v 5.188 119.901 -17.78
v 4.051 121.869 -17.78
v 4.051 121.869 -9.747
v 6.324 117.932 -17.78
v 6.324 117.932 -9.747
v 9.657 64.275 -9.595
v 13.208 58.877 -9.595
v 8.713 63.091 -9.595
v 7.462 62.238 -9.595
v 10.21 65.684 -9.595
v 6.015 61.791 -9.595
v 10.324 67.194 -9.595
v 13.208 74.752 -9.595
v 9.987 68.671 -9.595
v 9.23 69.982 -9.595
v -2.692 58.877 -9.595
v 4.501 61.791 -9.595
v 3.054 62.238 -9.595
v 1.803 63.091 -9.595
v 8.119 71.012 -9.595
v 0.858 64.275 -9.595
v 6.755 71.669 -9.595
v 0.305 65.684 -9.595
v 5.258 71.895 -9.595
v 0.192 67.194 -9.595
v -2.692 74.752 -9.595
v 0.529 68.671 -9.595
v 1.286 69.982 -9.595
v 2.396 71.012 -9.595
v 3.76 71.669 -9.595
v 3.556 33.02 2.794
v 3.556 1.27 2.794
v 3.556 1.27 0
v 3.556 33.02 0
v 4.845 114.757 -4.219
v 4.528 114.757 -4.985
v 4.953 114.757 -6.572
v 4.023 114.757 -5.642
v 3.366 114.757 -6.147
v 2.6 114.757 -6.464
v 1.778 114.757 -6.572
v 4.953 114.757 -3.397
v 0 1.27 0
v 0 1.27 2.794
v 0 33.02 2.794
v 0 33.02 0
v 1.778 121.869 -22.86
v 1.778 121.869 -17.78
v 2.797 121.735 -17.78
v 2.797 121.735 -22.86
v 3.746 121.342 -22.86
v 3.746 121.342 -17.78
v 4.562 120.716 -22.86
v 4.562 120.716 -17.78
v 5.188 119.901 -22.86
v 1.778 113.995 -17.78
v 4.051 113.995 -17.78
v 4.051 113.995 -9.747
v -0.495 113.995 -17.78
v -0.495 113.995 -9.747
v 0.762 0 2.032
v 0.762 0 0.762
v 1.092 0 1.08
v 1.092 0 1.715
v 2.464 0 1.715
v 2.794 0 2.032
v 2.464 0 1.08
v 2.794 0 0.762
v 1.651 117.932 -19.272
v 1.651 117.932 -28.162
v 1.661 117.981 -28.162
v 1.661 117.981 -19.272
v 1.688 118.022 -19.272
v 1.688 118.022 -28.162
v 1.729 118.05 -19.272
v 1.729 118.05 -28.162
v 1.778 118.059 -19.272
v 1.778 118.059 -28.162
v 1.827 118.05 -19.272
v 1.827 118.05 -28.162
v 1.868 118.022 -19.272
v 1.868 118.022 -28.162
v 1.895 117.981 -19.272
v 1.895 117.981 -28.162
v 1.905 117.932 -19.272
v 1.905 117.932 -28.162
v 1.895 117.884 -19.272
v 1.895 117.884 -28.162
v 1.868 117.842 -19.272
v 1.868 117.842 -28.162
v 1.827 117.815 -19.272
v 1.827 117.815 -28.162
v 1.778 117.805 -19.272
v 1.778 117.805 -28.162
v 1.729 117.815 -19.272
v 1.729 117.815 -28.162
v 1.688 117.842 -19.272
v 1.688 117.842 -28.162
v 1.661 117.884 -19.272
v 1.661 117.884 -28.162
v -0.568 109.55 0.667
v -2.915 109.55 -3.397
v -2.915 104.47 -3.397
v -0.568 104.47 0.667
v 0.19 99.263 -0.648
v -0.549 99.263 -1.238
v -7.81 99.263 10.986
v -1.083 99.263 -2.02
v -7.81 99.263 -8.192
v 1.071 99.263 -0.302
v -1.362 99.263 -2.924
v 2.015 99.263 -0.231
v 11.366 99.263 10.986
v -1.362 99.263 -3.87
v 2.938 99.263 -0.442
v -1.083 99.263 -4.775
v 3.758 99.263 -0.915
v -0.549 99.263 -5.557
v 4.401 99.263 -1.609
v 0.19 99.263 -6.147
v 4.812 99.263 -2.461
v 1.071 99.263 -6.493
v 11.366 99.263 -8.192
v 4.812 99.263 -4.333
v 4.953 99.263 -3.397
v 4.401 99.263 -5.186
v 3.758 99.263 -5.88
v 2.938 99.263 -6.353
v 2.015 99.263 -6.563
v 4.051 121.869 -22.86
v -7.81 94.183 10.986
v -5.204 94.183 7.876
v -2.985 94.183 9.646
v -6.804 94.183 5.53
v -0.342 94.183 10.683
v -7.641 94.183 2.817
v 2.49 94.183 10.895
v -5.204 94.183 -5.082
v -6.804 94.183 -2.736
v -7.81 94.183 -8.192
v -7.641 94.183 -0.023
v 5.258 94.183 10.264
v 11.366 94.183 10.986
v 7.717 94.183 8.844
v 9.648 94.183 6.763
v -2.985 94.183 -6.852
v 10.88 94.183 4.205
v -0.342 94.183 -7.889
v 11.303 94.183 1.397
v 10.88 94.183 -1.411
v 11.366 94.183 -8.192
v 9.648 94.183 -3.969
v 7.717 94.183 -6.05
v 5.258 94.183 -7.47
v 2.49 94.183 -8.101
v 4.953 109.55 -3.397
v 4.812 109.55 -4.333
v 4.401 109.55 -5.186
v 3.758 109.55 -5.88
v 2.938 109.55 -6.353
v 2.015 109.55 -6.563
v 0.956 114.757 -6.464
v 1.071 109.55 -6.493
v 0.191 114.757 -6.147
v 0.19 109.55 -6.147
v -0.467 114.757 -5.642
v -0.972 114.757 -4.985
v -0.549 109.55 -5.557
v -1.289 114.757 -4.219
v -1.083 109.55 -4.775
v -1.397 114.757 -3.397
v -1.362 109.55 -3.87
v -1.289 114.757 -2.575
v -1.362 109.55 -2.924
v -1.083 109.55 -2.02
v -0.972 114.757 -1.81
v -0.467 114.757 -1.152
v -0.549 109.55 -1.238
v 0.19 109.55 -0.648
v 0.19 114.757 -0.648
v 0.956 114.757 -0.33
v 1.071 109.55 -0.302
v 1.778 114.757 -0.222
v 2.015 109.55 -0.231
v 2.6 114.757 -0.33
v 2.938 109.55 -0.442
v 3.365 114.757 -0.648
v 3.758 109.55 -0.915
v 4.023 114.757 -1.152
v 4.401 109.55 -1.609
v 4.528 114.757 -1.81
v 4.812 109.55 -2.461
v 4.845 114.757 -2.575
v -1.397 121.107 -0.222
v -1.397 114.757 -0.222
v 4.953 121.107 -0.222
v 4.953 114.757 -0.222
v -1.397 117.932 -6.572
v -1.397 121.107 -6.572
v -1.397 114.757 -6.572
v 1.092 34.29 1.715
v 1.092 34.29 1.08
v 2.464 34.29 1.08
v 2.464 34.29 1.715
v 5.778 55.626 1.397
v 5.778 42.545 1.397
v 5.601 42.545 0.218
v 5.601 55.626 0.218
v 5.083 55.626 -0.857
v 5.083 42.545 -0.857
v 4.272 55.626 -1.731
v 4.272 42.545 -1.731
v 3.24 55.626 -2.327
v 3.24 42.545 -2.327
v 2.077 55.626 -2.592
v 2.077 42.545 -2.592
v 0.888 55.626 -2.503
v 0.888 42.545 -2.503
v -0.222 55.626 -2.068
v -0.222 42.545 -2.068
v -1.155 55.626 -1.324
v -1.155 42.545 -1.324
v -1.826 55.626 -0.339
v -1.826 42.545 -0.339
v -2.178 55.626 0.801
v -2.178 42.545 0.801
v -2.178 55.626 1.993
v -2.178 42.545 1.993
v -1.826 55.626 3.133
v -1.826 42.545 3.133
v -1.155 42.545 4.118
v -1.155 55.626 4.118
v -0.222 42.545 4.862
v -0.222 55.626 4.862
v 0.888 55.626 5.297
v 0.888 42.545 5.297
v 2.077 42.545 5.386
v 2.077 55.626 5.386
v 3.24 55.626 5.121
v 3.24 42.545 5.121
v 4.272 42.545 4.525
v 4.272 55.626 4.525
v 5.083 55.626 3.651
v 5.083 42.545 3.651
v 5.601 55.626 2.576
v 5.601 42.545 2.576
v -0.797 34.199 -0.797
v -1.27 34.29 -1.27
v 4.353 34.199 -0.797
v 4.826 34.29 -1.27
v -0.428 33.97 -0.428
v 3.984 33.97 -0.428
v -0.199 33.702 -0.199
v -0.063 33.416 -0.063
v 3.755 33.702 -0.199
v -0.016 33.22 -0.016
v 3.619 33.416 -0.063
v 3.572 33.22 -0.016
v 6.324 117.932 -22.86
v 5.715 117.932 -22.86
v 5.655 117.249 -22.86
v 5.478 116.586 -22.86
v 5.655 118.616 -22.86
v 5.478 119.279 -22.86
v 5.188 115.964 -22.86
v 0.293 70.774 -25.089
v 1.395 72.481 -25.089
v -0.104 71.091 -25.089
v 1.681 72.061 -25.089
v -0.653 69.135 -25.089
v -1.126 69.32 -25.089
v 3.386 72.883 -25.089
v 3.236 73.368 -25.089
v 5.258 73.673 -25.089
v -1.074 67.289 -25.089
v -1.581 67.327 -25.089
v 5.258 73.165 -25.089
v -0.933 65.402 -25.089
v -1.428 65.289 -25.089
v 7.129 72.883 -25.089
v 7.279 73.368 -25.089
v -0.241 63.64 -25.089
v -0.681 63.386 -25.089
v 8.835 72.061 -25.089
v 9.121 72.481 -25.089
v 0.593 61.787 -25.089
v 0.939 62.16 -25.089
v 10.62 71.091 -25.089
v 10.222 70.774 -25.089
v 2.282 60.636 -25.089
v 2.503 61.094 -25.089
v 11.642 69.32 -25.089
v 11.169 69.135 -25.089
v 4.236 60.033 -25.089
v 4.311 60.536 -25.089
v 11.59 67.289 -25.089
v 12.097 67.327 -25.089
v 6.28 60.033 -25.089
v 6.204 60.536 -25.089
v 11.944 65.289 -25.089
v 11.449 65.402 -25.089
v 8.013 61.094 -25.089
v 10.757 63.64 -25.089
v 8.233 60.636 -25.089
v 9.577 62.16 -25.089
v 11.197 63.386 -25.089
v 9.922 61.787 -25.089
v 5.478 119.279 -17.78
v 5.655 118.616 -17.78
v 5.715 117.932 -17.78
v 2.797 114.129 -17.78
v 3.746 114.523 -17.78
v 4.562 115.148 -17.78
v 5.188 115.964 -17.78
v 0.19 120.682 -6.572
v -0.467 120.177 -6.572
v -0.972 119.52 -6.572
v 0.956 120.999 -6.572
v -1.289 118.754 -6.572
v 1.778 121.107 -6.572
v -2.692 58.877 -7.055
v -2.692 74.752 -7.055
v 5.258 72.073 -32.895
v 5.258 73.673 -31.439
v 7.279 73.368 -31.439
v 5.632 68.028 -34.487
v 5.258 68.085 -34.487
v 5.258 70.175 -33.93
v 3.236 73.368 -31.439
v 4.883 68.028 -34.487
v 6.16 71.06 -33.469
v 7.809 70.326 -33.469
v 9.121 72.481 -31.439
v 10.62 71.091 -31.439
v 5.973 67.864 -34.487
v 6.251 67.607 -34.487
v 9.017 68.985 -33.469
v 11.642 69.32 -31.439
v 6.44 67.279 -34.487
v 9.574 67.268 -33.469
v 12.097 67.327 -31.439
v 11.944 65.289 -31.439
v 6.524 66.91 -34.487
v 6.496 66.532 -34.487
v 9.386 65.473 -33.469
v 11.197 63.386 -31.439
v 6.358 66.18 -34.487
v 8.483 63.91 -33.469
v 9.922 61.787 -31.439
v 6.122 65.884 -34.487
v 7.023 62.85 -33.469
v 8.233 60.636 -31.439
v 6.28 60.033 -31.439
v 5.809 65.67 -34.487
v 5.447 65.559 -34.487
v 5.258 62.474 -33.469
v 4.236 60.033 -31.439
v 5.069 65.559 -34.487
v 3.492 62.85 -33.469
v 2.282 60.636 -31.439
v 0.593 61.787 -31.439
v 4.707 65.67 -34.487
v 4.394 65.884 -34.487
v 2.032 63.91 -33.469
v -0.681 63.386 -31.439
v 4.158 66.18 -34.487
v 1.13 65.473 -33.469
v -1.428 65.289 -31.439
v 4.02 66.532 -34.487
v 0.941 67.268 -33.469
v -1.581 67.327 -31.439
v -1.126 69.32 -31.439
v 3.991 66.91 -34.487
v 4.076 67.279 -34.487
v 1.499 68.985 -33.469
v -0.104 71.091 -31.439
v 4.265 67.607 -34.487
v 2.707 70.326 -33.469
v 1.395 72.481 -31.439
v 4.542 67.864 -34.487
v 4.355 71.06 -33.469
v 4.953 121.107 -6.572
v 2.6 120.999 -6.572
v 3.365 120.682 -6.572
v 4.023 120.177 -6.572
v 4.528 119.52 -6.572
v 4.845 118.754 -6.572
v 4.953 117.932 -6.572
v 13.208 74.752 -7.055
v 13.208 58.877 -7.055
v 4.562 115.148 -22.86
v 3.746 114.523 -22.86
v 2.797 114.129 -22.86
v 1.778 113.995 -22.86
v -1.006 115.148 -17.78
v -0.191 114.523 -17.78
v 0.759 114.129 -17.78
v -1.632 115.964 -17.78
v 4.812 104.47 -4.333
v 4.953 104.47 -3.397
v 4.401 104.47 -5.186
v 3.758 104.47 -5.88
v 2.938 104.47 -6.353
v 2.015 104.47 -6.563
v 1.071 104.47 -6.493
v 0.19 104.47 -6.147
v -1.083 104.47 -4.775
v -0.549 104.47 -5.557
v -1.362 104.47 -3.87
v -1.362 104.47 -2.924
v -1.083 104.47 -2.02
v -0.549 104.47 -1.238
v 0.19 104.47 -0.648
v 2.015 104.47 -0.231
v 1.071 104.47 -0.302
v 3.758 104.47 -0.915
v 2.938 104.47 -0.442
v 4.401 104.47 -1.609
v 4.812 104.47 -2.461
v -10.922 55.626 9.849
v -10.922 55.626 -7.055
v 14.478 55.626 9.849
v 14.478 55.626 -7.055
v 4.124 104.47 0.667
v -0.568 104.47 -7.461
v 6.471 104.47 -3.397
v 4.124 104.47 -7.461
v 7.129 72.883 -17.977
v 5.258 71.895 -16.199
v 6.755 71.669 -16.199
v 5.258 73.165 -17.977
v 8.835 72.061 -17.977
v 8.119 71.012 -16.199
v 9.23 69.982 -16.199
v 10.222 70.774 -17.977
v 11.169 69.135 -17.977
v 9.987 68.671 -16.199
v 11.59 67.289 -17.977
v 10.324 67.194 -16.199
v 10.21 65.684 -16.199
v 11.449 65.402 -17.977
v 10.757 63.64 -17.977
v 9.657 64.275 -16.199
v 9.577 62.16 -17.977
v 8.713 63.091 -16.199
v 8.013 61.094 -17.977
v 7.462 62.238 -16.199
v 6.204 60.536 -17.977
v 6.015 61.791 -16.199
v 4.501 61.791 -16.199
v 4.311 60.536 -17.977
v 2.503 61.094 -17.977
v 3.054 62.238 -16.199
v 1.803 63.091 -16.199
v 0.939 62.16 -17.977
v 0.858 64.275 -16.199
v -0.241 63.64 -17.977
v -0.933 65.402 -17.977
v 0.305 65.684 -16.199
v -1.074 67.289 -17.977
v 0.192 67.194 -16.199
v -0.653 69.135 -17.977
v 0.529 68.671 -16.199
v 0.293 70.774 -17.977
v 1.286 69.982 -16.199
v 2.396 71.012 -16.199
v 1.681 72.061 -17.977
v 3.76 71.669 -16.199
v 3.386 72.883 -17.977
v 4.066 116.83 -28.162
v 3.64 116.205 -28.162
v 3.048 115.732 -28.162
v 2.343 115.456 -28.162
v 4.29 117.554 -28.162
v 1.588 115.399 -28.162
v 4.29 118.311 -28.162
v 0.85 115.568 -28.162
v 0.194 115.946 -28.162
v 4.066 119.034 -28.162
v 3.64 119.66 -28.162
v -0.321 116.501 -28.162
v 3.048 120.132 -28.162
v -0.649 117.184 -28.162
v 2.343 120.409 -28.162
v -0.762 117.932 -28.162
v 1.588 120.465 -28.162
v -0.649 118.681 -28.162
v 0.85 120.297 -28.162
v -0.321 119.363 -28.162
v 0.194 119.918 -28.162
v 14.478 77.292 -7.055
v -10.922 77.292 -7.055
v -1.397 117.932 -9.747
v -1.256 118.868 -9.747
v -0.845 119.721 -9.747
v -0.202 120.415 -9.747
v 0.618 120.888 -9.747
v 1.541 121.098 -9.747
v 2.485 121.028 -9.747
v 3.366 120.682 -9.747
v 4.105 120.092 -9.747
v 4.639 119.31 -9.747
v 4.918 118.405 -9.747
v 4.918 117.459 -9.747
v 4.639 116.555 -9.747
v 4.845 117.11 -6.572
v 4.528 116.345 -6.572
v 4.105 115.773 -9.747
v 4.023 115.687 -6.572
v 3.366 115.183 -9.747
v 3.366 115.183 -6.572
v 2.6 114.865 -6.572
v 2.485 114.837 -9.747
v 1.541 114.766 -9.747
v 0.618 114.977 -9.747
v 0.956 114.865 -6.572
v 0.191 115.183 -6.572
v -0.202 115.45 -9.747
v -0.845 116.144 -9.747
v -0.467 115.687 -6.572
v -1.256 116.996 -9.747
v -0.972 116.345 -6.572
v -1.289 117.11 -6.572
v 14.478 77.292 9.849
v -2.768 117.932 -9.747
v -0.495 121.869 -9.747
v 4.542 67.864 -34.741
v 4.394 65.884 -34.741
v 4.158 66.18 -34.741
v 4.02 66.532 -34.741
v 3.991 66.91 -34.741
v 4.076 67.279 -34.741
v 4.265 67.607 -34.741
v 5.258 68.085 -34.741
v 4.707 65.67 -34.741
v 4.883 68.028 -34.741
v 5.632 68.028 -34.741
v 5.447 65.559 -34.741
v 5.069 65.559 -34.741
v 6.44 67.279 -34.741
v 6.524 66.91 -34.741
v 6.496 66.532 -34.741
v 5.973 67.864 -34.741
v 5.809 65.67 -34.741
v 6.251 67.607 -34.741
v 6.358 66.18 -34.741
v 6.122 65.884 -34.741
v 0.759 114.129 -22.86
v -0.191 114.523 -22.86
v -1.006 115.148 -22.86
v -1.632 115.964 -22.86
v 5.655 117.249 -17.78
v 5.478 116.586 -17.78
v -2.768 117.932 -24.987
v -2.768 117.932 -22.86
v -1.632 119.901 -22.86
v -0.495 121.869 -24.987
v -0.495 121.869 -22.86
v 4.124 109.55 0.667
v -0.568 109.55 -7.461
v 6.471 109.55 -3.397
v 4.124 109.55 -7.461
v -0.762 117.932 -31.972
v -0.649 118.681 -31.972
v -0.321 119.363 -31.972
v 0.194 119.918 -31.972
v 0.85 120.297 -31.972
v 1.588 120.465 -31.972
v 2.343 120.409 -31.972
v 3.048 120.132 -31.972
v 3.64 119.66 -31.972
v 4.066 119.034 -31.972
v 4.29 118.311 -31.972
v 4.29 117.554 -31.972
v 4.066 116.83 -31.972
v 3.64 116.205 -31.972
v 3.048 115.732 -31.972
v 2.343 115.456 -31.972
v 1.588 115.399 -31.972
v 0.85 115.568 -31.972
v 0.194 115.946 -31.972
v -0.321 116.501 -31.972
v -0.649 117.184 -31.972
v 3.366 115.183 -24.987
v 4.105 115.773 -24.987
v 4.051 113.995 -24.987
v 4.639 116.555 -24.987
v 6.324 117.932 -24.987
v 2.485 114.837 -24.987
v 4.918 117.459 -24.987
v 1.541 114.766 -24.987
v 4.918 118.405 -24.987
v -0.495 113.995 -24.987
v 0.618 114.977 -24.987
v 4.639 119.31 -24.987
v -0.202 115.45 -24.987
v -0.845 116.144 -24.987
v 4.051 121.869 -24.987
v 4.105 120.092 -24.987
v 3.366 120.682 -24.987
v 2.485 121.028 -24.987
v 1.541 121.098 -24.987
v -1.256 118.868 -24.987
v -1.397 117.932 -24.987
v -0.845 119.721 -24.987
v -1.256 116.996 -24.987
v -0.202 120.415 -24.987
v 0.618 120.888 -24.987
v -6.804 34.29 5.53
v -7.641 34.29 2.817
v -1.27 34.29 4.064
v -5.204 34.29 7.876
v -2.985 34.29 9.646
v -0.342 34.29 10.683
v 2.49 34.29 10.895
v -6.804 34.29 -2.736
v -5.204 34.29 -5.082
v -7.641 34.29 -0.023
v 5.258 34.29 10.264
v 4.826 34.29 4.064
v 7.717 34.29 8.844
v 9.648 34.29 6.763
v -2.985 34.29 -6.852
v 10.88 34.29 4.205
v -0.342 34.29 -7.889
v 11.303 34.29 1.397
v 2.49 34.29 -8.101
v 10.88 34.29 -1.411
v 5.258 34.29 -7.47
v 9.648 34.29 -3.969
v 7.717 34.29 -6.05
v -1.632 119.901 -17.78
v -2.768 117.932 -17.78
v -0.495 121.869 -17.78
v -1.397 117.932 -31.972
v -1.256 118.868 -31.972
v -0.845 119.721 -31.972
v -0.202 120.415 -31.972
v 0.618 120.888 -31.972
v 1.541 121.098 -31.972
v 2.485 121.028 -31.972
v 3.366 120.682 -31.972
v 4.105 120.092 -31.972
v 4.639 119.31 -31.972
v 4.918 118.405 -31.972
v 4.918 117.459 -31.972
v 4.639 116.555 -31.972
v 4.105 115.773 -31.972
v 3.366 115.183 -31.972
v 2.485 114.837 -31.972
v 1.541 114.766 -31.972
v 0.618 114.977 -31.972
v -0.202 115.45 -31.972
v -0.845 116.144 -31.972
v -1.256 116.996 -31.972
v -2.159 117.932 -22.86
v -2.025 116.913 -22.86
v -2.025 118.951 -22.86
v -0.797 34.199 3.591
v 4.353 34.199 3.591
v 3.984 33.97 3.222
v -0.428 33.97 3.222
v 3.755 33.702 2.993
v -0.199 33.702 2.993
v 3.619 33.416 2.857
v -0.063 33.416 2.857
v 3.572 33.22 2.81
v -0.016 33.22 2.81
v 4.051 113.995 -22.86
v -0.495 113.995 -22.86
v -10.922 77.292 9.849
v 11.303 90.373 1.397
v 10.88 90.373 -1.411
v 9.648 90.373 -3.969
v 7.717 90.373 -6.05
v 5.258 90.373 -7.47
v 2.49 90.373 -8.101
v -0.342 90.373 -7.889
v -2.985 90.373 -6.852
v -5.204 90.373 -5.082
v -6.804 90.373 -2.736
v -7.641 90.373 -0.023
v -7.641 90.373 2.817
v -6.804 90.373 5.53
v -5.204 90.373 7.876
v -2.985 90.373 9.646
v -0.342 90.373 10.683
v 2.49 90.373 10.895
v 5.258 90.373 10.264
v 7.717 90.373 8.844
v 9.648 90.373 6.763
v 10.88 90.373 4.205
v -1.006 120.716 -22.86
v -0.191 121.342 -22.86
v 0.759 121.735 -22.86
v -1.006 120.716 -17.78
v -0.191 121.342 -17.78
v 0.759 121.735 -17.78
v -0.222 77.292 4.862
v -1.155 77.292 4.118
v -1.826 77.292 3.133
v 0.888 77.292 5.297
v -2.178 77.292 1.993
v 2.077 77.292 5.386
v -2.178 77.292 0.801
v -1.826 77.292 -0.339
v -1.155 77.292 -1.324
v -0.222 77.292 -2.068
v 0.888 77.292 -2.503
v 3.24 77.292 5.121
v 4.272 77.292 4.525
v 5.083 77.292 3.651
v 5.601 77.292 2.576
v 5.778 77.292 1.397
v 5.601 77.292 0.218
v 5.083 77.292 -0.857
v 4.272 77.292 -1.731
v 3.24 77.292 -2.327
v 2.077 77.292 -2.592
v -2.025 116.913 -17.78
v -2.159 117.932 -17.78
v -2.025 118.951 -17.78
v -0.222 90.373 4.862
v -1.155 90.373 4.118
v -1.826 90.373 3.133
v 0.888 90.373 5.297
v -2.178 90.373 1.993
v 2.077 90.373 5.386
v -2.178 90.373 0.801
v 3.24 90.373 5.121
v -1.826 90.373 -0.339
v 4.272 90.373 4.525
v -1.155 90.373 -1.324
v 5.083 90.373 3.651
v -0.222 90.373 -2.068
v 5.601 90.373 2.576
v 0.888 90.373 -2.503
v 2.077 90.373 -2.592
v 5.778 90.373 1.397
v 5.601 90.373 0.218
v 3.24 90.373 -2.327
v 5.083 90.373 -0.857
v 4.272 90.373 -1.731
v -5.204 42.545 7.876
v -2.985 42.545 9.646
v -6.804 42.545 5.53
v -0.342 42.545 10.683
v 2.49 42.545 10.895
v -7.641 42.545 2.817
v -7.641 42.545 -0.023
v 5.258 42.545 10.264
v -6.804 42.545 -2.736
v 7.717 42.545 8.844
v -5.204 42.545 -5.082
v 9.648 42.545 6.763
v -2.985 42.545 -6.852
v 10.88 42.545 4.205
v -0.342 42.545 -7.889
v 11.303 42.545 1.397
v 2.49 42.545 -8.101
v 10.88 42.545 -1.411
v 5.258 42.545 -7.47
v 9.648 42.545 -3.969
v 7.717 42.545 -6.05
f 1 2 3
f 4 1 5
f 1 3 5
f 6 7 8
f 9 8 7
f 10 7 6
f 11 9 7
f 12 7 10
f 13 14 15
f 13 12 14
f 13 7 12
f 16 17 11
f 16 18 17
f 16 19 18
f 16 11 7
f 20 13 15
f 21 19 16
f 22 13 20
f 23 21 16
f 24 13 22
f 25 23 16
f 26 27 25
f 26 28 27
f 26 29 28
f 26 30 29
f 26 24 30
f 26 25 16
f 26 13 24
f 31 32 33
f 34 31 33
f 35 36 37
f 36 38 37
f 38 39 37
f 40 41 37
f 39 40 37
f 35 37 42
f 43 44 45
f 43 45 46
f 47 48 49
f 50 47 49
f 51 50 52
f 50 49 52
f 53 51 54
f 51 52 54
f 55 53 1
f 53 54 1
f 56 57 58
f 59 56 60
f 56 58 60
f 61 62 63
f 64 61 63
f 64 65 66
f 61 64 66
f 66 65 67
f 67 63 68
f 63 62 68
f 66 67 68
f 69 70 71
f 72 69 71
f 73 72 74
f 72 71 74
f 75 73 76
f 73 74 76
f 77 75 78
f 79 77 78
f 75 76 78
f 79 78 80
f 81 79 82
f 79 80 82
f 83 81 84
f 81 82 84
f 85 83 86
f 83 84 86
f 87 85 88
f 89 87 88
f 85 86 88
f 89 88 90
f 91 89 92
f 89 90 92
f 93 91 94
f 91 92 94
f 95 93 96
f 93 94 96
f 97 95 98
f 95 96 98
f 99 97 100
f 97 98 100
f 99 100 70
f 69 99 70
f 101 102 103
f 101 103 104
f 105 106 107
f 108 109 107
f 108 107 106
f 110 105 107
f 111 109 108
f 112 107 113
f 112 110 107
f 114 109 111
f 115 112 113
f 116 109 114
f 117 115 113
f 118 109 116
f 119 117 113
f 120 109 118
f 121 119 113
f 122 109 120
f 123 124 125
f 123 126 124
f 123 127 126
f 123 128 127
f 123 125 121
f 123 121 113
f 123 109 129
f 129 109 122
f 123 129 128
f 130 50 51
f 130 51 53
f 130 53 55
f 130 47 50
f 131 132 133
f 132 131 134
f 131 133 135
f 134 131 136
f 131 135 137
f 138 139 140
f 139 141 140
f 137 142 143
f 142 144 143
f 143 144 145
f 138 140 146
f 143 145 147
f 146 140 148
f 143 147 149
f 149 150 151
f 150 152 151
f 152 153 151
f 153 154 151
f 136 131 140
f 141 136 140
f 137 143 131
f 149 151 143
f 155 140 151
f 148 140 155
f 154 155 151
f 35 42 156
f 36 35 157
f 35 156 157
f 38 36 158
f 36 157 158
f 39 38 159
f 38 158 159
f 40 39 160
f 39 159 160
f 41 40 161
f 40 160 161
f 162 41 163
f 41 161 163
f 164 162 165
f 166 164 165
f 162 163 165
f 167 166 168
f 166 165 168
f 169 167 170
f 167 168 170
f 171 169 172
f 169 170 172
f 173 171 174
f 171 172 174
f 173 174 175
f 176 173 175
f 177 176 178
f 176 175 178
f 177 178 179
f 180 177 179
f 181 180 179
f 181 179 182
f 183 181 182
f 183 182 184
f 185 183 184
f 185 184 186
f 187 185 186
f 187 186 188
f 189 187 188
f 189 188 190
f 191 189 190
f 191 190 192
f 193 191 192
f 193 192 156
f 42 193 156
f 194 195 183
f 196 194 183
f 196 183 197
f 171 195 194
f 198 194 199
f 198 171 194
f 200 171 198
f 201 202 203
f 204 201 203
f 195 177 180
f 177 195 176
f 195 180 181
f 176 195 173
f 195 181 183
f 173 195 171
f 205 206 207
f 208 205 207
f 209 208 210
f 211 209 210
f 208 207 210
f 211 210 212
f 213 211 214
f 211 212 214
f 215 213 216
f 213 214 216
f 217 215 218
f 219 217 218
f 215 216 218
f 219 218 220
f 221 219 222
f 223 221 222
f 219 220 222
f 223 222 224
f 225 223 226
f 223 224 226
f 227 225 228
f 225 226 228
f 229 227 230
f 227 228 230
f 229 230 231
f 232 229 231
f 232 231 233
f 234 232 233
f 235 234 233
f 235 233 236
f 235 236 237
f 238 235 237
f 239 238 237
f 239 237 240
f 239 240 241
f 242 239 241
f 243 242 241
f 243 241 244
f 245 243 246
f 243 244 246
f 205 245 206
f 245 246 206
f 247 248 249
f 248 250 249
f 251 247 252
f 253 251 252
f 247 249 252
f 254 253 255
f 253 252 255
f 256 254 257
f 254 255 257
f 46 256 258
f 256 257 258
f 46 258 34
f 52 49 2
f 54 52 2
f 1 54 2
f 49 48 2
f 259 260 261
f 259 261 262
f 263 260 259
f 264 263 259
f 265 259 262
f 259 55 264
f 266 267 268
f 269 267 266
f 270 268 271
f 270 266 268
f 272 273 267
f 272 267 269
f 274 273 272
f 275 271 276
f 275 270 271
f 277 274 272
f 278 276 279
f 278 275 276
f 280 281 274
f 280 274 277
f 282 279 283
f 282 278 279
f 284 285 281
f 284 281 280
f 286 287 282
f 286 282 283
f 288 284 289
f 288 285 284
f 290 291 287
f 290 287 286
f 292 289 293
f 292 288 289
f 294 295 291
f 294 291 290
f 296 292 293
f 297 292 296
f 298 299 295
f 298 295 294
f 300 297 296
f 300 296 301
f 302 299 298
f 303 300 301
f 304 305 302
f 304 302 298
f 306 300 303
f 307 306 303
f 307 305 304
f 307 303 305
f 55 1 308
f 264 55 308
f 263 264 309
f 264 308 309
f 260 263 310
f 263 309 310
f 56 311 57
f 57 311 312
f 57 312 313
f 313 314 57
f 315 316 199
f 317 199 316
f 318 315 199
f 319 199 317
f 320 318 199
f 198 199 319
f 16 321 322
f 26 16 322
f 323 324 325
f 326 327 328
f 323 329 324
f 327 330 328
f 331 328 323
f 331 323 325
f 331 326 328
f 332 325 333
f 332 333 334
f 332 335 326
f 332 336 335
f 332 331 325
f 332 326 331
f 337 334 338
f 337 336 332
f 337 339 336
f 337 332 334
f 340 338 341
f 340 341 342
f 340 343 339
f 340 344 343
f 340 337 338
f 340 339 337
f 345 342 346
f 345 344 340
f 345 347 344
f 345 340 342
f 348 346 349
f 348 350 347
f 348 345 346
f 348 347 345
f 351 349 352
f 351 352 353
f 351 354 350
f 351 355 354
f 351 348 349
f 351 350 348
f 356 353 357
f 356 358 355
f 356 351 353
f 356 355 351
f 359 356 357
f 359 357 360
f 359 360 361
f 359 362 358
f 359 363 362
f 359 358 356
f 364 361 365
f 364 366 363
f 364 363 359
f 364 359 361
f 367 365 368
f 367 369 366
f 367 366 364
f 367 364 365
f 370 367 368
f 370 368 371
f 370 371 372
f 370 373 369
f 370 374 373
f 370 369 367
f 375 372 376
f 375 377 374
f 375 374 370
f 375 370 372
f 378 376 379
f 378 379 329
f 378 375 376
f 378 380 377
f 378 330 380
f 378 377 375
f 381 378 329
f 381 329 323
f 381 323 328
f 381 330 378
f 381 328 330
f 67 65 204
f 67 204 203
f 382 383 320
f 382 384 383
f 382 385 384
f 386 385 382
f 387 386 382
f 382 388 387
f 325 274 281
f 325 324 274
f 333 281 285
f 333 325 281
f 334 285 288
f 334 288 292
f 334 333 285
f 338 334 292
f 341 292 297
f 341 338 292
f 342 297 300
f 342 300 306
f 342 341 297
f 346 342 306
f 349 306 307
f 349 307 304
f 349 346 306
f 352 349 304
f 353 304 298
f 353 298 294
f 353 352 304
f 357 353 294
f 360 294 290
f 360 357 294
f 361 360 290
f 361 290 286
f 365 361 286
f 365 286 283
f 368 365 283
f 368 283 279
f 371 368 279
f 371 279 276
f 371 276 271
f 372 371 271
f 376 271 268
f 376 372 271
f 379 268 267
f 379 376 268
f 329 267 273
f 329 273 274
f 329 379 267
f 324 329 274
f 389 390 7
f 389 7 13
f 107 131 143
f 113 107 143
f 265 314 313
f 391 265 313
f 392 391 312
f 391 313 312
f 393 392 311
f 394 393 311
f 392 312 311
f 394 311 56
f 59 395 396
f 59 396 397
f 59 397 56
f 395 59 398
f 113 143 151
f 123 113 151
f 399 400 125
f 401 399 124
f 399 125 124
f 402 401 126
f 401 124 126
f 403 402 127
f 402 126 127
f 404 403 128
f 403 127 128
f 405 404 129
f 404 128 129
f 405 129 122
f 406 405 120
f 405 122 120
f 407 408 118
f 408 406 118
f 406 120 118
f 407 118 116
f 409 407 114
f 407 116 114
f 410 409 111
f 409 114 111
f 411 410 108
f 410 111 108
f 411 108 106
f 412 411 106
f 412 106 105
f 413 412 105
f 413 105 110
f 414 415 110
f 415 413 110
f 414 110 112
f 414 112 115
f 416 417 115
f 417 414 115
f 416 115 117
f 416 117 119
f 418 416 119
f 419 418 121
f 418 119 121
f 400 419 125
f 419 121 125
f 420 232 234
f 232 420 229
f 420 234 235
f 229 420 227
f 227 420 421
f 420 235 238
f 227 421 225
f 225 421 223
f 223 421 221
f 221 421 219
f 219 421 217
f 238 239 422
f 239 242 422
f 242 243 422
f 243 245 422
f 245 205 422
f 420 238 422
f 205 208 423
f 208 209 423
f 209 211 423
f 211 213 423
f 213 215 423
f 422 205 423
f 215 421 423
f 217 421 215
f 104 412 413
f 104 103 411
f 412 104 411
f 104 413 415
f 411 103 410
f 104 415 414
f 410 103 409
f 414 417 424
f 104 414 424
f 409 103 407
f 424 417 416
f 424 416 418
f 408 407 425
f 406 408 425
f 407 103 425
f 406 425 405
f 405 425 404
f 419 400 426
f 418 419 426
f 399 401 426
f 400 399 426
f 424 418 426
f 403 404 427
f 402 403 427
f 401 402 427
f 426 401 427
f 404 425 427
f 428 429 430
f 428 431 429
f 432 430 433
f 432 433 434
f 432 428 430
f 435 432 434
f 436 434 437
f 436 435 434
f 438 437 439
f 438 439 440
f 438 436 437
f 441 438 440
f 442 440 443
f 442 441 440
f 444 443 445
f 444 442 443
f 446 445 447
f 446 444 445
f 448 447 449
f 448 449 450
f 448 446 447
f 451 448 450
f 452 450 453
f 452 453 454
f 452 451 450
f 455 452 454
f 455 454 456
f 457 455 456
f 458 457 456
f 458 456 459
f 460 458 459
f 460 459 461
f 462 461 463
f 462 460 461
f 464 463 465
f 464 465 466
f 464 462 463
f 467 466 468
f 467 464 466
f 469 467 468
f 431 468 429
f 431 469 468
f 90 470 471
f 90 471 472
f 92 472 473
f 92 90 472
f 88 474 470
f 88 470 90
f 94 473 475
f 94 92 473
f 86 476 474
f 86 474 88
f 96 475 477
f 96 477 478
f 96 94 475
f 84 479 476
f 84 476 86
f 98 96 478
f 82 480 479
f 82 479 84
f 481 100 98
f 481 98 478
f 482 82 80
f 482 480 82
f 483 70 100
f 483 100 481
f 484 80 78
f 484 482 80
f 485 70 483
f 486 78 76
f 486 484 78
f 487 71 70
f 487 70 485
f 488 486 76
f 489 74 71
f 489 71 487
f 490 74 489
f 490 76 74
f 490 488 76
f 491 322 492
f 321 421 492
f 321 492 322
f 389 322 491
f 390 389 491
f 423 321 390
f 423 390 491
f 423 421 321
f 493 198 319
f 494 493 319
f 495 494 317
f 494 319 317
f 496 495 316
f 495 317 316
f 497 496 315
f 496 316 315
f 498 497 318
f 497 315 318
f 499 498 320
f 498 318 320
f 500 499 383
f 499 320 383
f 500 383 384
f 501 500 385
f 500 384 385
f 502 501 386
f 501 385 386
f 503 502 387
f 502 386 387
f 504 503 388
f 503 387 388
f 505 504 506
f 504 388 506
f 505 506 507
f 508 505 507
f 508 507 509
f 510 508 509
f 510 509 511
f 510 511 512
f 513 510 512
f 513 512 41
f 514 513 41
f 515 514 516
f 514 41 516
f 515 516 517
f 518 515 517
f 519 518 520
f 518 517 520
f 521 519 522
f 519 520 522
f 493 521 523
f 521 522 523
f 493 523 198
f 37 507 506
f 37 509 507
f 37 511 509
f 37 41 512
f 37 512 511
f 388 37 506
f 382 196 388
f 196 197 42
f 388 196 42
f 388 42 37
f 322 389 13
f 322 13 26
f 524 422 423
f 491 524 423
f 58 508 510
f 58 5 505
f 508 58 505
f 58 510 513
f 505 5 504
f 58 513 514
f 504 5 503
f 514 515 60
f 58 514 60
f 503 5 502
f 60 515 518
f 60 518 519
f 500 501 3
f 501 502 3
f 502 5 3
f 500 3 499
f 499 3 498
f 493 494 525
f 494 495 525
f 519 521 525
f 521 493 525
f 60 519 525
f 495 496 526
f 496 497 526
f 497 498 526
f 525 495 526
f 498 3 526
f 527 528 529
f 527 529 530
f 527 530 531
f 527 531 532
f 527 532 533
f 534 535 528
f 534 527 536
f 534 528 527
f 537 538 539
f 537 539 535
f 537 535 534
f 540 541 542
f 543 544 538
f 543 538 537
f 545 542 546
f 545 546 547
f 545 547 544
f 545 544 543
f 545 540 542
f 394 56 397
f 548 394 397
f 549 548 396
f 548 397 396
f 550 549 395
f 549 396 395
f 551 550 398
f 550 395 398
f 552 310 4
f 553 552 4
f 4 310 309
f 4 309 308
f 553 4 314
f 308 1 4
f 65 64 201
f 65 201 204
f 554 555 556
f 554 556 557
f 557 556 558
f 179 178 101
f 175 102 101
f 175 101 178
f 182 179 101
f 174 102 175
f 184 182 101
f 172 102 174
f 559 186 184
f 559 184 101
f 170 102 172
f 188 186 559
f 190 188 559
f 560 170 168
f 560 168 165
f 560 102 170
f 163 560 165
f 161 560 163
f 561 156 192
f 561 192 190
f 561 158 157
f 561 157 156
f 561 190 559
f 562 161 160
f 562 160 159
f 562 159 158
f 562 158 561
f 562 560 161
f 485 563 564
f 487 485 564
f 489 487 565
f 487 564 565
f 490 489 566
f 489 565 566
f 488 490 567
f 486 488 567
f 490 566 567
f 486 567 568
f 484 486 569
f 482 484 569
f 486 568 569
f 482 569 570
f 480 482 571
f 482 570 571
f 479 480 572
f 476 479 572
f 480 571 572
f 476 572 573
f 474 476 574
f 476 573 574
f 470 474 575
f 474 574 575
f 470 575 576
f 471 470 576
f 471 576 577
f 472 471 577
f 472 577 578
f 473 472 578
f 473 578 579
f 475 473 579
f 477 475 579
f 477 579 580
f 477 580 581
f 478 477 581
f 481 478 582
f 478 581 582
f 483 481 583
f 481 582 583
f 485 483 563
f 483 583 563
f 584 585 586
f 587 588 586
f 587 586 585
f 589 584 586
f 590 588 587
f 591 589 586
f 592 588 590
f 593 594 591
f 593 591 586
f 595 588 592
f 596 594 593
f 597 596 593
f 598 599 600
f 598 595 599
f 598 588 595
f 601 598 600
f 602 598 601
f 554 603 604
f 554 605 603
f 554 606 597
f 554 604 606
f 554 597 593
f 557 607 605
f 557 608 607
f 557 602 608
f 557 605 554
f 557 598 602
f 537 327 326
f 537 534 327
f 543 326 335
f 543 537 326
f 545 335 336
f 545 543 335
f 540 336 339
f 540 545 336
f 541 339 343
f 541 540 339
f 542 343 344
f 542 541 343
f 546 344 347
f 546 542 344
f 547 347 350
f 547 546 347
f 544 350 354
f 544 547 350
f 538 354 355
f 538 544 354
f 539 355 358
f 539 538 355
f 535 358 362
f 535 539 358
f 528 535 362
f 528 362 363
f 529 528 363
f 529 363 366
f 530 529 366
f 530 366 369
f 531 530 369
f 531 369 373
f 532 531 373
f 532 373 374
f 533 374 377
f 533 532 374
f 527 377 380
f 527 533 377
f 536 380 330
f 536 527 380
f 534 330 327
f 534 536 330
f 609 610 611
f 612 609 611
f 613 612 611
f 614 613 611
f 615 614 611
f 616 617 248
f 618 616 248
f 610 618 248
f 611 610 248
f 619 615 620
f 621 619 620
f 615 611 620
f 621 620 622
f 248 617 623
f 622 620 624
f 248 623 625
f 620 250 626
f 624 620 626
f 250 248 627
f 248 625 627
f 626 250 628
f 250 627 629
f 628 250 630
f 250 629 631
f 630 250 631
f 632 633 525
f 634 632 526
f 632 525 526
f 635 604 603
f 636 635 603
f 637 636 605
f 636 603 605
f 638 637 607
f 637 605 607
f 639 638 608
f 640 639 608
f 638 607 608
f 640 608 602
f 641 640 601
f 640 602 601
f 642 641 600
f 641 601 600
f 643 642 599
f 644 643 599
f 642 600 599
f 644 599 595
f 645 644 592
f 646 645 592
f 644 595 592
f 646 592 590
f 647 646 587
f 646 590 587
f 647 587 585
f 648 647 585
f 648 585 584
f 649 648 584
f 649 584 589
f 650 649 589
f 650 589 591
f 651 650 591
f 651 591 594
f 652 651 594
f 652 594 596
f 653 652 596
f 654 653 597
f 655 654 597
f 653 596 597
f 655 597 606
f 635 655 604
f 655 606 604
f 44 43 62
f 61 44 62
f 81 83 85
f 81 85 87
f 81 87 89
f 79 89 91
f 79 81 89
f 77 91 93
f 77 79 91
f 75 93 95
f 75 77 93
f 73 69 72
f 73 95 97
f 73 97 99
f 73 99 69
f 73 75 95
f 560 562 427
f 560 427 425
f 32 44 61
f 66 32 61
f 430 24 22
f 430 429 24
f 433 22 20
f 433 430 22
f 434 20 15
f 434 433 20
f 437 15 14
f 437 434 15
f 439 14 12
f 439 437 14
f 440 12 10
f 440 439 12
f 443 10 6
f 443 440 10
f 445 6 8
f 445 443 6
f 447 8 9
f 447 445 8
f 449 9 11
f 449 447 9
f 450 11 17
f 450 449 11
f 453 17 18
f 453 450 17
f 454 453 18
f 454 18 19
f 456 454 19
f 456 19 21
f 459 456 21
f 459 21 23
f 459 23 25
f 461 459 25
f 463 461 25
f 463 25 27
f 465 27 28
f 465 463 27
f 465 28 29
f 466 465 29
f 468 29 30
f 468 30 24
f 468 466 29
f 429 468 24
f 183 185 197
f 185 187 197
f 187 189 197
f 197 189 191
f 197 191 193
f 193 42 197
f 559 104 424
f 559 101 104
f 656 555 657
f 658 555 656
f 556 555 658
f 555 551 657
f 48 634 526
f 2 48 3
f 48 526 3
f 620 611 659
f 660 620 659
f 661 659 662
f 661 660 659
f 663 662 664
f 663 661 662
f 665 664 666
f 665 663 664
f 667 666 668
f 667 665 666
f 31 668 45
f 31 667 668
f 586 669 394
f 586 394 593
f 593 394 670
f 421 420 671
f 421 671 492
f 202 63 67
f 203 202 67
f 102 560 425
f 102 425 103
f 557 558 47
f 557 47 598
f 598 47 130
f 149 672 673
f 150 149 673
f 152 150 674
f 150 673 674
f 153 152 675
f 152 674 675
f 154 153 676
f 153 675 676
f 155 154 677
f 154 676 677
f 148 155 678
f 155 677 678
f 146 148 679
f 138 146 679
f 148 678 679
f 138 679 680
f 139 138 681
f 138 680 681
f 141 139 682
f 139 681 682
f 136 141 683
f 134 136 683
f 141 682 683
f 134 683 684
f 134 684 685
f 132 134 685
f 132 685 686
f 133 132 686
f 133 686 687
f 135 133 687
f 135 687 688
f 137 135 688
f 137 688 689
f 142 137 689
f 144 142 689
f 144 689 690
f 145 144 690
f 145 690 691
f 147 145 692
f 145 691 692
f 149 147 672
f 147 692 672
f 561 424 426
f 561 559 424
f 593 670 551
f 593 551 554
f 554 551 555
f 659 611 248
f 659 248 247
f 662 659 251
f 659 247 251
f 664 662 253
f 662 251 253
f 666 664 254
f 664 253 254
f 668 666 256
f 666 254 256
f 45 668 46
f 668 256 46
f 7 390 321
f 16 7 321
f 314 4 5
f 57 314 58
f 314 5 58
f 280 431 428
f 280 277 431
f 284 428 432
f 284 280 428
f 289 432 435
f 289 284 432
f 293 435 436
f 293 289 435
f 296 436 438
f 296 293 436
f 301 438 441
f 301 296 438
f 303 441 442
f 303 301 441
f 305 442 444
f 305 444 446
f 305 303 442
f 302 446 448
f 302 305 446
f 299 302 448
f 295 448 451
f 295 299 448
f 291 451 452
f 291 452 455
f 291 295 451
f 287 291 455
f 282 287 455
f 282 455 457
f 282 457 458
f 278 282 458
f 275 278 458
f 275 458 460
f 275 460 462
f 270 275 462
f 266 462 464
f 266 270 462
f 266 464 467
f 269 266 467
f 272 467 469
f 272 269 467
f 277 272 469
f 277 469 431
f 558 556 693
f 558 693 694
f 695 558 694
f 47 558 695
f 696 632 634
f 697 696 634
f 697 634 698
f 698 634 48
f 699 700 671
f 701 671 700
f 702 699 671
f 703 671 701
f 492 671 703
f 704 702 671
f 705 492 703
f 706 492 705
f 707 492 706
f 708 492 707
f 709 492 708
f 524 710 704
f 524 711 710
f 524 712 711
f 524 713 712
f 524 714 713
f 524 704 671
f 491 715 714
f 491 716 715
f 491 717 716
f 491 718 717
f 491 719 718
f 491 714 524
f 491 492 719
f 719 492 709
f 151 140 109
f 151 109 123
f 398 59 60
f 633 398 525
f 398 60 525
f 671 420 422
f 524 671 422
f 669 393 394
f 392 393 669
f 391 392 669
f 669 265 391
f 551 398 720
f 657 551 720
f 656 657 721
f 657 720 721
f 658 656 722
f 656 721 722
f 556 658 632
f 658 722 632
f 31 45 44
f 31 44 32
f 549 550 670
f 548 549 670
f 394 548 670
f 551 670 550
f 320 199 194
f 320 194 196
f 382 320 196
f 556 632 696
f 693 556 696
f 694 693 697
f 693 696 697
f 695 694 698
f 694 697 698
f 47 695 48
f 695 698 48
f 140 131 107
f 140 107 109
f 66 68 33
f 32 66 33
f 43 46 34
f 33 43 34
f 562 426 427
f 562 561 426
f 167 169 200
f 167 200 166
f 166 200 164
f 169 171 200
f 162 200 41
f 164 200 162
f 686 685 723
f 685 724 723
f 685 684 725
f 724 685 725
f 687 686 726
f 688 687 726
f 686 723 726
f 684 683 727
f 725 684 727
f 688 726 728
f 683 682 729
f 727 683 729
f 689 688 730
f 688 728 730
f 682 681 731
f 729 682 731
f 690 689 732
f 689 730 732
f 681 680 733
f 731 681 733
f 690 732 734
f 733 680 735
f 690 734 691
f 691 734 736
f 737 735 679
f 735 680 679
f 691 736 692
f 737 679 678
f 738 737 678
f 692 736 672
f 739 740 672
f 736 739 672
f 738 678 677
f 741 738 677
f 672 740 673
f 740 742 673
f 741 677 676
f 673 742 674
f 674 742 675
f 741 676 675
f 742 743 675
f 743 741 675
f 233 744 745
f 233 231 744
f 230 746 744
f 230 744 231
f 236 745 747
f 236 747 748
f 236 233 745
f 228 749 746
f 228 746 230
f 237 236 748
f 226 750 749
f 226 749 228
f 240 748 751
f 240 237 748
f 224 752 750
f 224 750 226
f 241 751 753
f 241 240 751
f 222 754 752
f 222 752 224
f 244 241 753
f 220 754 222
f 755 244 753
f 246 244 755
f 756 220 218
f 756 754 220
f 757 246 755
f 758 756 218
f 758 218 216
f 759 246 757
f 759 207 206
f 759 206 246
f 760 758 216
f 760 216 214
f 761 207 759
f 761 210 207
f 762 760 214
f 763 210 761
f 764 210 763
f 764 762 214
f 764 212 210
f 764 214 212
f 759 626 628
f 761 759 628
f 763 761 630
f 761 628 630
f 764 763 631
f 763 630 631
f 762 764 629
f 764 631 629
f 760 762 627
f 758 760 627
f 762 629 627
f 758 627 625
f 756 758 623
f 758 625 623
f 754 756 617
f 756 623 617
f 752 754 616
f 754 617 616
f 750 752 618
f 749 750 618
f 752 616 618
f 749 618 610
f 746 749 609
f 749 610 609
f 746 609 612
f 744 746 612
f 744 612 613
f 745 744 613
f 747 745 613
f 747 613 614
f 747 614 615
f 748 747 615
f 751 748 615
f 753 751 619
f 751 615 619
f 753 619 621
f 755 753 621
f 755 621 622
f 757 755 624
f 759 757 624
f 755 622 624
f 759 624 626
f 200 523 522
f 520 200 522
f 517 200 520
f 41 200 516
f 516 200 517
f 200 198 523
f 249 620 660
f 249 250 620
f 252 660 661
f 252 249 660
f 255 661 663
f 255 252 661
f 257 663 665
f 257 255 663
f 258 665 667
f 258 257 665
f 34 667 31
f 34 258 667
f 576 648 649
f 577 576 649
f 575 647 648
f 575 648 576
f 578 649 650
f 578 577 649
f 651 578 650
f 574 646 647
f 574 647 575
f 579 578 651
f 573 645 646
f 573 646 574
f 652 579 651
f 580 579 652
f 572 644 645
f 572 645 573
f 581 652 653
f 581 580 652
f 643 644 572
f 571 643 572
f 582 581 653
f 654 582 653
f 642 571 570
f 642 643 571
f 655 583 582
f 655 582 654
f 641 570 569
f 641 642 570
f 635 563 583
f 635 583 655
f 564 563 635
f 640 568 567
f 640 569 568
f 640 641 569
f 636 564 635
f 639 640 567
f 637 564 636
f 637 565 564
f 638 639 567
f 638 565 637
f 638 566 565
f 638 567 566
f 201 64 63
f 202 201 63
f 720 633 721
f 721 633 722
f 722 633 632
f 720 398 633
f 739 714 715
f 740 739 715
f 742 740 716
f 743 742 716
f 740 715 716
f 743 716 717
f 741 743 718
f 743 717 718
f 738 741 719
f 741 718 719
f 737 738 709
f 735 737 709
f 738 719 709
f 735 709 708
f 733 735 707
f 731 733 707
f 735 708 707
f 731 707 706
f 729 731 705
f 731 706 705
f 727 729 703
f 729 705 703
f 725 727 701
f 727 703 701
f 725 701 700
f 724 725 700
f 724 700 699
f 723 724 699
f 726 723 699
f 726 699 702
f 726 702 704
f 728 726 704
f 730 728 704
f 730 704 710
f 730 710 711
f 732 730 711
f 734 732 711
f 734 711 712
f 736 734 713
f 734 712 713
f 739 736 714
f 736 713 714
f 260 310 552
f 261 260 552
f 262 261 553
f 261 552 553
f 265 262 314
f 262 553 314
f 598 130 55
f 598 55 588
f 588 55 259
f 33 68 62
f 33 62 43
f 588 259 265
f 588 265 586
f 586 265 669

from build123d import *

# Parameters (mm, degrees)
SKETCH1_W            = 3.556
SKETCH1_H            = 2.794
SKETCH1_W_2          = 1.3716
SKETCH1_H_2          = 0.635
BOSS_EXTRUDE1_DEPTH  = 34.29
SKETCH2_R            = 9.525
BOSS_EXTRUDE2_DEPTH  = 8.255
SKETCH3_R            = 4.0005
BOSS_EXTRUDE3_DEPTH  = 13.081
SKETCH4_W            = 25.4
SKETCH4_H            = 16.9037
BOSS_EXTRUDE4_DEPTH  = 21.6662
SKETCH5_R            = 4.0005
BOSS_EXTRUDE5_DEPTH  = 13.081
SKETCH6_R            = 9.525
BOSS_EXTRUDE6_DEPTH  = 3.81
SKETCH7_W            = 19.177
SKETCH7_H            = 19.177
BOSS_EXTRUDE7_DEPTH  = 5.08
SKETCH8_R            = 3.175
BOSS_EXTRUDE8_DEPTH  = 15.494
SKETCH9_W            = 6.35
SKETCH9_H            = 6.35
BOSS_EXTRUDE9_DEPTH  = 6.35
SKETCH10_R           = 3.175
BOSS_EXTRUDE10_DEPTH = 3.175
BOSS_EXTRUDE11_DEPTH = 15.24
SKETCH12_R           = 3.175
BOSS_EXTRUDE12_DEPTH = 6.985
SKETCH13_W           = 15.9004
SKETCH13_H           = 15.875
BOSS_EXTRUDE13_DEPTH = 2.54
BOSS_EXTRUDE15_DEPTH = 2.54
CUT_EXTRUDE1_DEPTH   = 15
CUT_EXTRUDE2_DEPTH   = 15
FILLET1_R            = 1.27
SKETCH22_R           = 2.54
SKETCH22_R_2         = 0.127
CUT_EXTRUDE3_DEPTH   = 3.81
SKETCH22_3_R         = 0.127
CUT_EXTRUDE4_DEPTH   = 12.7
CUT_EXTRUDE7_DEPTH   = 5.08


with BuildPart() as part:
    # Sketch1 → Boss-Extrude1 (new body)
    with BuildSketch(Plane(origin=(0, 0, 0), x_dir=(1, 0, 0), z_dir=(0, 1, 0))):
        with Locations((1.778, -1.397)):
            Rectangle(SKETCH1_W, SKETCH1_H)
        with Locations((1.778, -1.397)):
            Rectangle(SKETCH1_W_2, SKETCH1_H_2, mode=Mode.SUBTRACT)
    extrude(amount=BOSS_EXTRUDE1_DEPTH)

    # Sketch2 → Boss-Extrude2 (add)
    with BuildSketch(Plane(origin=(0, 34.29, 0), x_dir=(1, 0, 0), z_dir=(0, 1, 0))):
        with Locations((1.778, -1.397)):
            Circle(SKETCH2_R)
    extrude(amount=BOSS_EXTRUDE2_DEPTH)

    # Sketch3 → Boss-Extrude3 (add)
    with BuildSketch(Plane(origin=(0, 42.545, 0), x_dir=(1, 0, 0), z_dir=(0, 1, 0))):
        with Locations((1.778, -1.397)):
            Circle(SKETCH3_R)
    extrude(amount=BOSS_EXTRUDE3_DEPTH)

    # Sketch4 → Boss-Extrude4 (add)
    with BuildSketch(Plane(origin=(0, 55.626, 0), x_dir=(1, 0, 0), z_dir=(0, 1, 0))):
        with Locations((1.778, -1.397)):
            Rectangle(SKETCH4_W, SKETCH4_H)
    extrude(amount=BOSS_EXTRUDE4_DEPTH)

    # Sketch5 → Boss-Extrude5 (add)
    with BuildSketch(Plane(origin=(0, 77.2922, 0), x_dir=(1, 0, 0), z_dir=(0, 1, 0))):
        with Locations((1.778, -1.397)):
            Circle(SKETCH5_R)
    extrude(amount=BOSS_EXTRUDE5_DEPTH)

    # Sketch6 → Boss-Extrude6 (add)
    with BuildSketch(Plane(origin=(0, 90.3732, 0), x_dir=(1, 0, 0), z_dir=(0, 1, 0))):
        with Locations((1.778, -1.397)):
            Circle(SKETCH6_R)
    extrude(amount=BOSS_EXTRUDE6_DEPTH)

    # Sketch7 → Boss-Extrude7 (add)
    with BuildSketch(Plane(origin=(0, 94.1832, 0), x_dir=(1, 0, 0), z_dir=(0, 1, 0))):
        with Locations((1.778, -1.397)):
            Rectangle(SKETCH7_W, SKETCH7_H)
    extrude(amount=BOSS_EXTRUDE7_DEPTH)

    # Sketch8 → Boss-Extrude8 (add)
    with BuildSketch(Plane(origin=(0, 99.2632, 0), x_dir=(1, 0, 0), z_dir=(0, 1, 0))):
        with Locations((1.778, 3.39725)):
            Circle(SKETCH8_R)
    extrude(amount=BOSS_EXTRUDE8_DEPTH)

    # Sketch9 → Boss-Extrude9 (add)
    with BuildSketch(Plane(origin=(0, 114.7572, 0), x_dir=(1, 0, 0), z_dir=(0, 1, 0))):
        with Locations((1.778, 3.39725)):
            Rectangle(SKETCH9_W, SKETCH9_H)
    extrude(amount=BOSS_EXTRUDE9_DEPTH)

    # Sketch10 → Boss-Extrude10 (add)
    with BuildSketch(Plane(origin=(0, 0, -6.57225), x_dir=(-1, 0, 0), z_dir=(0, 0, -1))):
        with Locations((-1.778, 117.9322)):
            Circle(SKETCH10_R)
    extrude(amount=BOSS_EXTRUDE10_DEPTH)

    # Sketch11 → Boss-Extrude11 (add)
    with BuildSketch(Plane(origin=(0, 0, -9.74725), x_dir=(-1, 0, 0), z_dir=(0, 0, -1))):
        Polygon((0.49502801, 113.9952), (2.76805602, 117.9322), (0.49502801, 121.8692), (-4.05102801, 121.8692), (-6.32405602, 117.9322), (-4.05102801, 113.9952), align=None)
    extrude(amount=BOSS_EXTRUDE11_DEPTH)

    # Sketch12 → Boss-Extrude12 (add)
    with BuildSketch(Plane(origin=(0, 0, -24.98725), x_dir=(-1, 0, 0), z_dir=(0, 0, -1))):
        with Locations((-1.778, 117.9322)):
            Circle(SKETCH12_R)
    extrude(amount=BOSS_EXTRUDE12_DEPTH)

    # Sketch13 → Boss-Extrude13 (add)
    with BuildSketch(Plane(origin=(0, 0, -7.05485), x_dir=(-1, 0, 0), z_dir=(0, 0, -1))):
        with Locations((-5.2578, 66.8147)):
            Rectangle(SKETCH13_W, SKETCH13_H)
    extrude(amount=BOSS_EXTRUDE13_DEPTH)

    # Sketch16 → Revolve1 (revolve)
    with BuildSketch(Plane(origin=(5.2578, 0, 0), x_dir=(0, 0, -1), z_dir=(1, 0, 0))):
        with BuildLine():
            Line((9.59485, 66.8147), (9.59485, 71.8947))
            Line((9.59485, 71.8947), (16.19885, 71.8947))
            Line((16.19885, 71.8947), (17.97685, 73.1647))
            Line((17.97685, 73.1647), (25.08885, 73.1647))
            Line((25.08885, 73.1647), (25.08885, 73.6727))
            Line((25.08885, 73.6727), (31.43885, 73.6727))
            ThreePointArc((31.43885, 73.6727), (33.469498821, 71.155053903), (34.48685, 68.0847))
            Line((34.48685, 68.0847), (34.74085, 68.0847))
            Line((34.74085, 68.0847), (34.74085, 66.8147))
            Line((34.74085, 66.8147), (9.59485, 66.8147))
        make_face()
    revolve(axis=Axis((5.2578, 66.8147, -9.59485), (0, 0, -1)))

    # Sketch17 → Boss-Extrude15 (add, symmetric)
    with BuildSketch(Plane(origin=(0, 107.0102, 0), x_dir=(1, 0, 0), z_dir=(0, 1, 0))):
        Polygon((6.470702988, 3.39725), (4.124351494, 7.46125), (-0.568351494, 7.46125), (-2.914702988, 3.39725), (-0.568351494, -0.66675), (4.124351494, -0.66675), align=None)
    extrude(amount=BOSS_EXTRUDE15_DEPTH, both=True)

    # Sketch20 → Cut-Extrude1 (cut)
    with BuildSketch(Plane.ZY):
        Polygon((0, 0), (0.762, 0), (0, 1.27), align=None)
        Polygon((2.794, 0), (2.794, 1.27), (2.032, 0), align=None)
    extrude(amount=-CUT_EXTRUDE1_DEPTH, mode=Mode.SUBTRACT)

    # Sketch21 → Cut-Extrude2 (cut)
    with BuildSketch(Plane(origin=(0, 0, 0), x_dir=(-1, 0, 0), z_dir=(0, 0, -1))):
        Polygon((-3.556, 1.27), (-3.556, 0), (-2.794, 0), align=None)
        Polygon((0, 1.27), (-0.762, 0), (0, 0), align=None)
    extrude(amount=-CUT_EXTRUDE2_DEPTH, mode=Mode.SUBTRACT)

    # Fillet1
    fillet1_edges = [part.edges().sort_by_distance(p)[0] for p in [
        (3.556, 34.29, 1.397),
        (1.778, 34.29, 2.794),
        (0, 34.29, 1.397),
        (1.778, 34.29, 0),
    ]]
    fillet(fillet1_edges, radius=FILLET1_R)

    # Sketch22 → Cut-Extrude3 (cut)
    with BuildSketch(Plane(origin=(0, 0, -31.97225), x_dir=(-1, 0, 0), z_dir=(0, 0, -1))):
        with Locations((-1.778, 117.9322)):
            Circle(SKETCH22_R)
        with Locations((-1.778, 117.9322)):
            Circle(SKETCH22_R_2, mode=Mode.SUBTRACT)
    extrude(amount=-CUT_EXTRUDE3_DEPTH, mode=Mode.SUBTRACT)

    # Sketch22<3> → Cut-Extrude4 (cut)
    with BuildSketch(Plane(origin=(0, 0, -31.97225), x_dir=(-1, 0, 0), z_dir=(0, 0, -1))):
        with Locations((-1.778, 117.9322)):
            Circle(SKETCH22_3_R)
    extrude(amount=-CUT_EXTRUDE4_DEPTH, mode=Mode.SUBTRACT)

    # Sketch25 → Cut-Extrude7 (cut)
    with BuildSketch(Plane.XY.offset(-17.78)):
        with BuildLine():
            Line((-1.63154216, 119.900699749), (-2.76805602, 117.9322))
            Line((-2.76805602, 117.9322), (-1.631542045, 115.963700052))
            ThreePointArc((-1.631542045, 115.963700052), (-2.159, 117.932199885), (-1.63154216, 119.900699749))
        make_face()
        with BuildLine():
            ThreePointArc((1.778, 113.9952), (-0.190500026, 114.522658), (-1.631542045, 115.963700052))
            Line((-1.631542045, 115.963700052), (-0.49502801, 113.9952))
            Line((-0.49502801, 113.9952), (1.778, 113.9952))
        make_face()
        with BuildLine():
            Line((-0.49502801, 121.8692), (-1.63154216, 119.900699749))
            ThreePointArc((-1.63154216, 119.900699749), (-0.190500126, 121.341741942), (1.778, 121.8692))
            Line((1.778, 121.8692), (-0.49502801, 121.8692))
        make_face()
        with BuildLine():
            ThreePointArc((5.18754197, 115.963699923), (3.746499961, 114.522657963), (1.778, 113.9952))
            Line((1.778, 113.9952), (4.05102801, 113.9952))
            Line((4.05102801, 113.9952), (5.18754197, 115.963699923))
        make_face()
        with BuildLine():
            Line((4.05102801, 121.8692), (1.778, 121.8692))
            ThreePointArc((1.778, 121.8692), (3.746499994, 121.341742018), (5.187542007, 119.900700013))
            Line((5.187542007, 119.900700013), (4.05102801, 121.8692))
        make_face()
        with BuildLine():
            ThreePointArc((5.187542007, 119.900700013), (5.715, 117.932199963), (5.18754197, 115.963699923))
            Line((5.18754197, 115.963699923), (6.32405602, 117.9322))
            Line((6.32405602, 117.9322), (5.187542007, 119.900700013))
        make_face()
    extrude(amount=-CUT_EXTRUDE7_DEPTH, mode=Mode.SUBTRACT)


solid = part.part
